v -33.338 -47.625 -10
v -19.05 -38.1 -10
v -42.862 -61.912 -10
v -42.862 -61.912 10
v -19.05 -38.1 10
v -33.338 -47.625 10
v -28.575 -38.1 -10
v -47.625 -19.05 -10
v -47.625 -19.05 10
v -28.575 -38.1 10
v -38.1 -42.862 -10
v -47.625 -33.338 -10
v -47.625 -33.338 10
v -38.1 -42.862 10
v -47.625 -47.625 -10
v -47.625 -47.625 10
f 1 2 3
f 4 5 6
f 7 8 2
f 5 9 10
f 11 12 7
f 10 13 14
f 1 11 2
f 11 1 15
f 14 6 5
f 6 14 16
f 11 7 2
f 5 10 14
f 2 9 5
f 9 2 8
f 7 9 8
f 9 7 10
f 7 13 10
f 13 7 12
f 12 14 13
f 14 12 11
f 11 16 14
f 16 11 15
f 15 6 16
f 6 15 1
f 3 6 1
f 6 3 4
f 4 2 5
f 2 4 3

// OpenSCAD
polyhedron(
    points=[
    [-19.05, -38.1, -10],
    [-47.625, -19.05, -10],
    [-28.575, -38.1, -10],
    [-47.625, -33.3375, -10],
    [-38.1, -42.8625, -10],
    [-47.625, -47.625, -10],
    [-33.3375, -47.625, -10],
    [-42.8625, -61.9125, -10],
    [-19.05, -38.1, 10],
    [-47.625, -19.05, 10],
    [-28.575, -38.1, 10],
    [-47.625, -33.3375, 10],
    [-38.1, -42.8625, 10],
    [-47.625, -47.625, 10],
    [-33.3375, -47.625, 10],
    [-42.8625, -61.9125, 10],
    ],
    faces=[
        [7,0,6],
        [14,8,15],
        [0,1,2],
        [10,9,8],
        [2,3,4],
        [12,11,10],
        [6,0,4,5],
        [13,12,8,14],
        [0,2,4],
        [12,10,8],
        [0,8,9,1],
        [1,9,10,2],
        [2,10,11,3],
        [3,11,12,4],
        [4,12,13,5],
        [5,13,14,6],
        [6,14,15,7],
        [7,15,8,0],
    ]
);
